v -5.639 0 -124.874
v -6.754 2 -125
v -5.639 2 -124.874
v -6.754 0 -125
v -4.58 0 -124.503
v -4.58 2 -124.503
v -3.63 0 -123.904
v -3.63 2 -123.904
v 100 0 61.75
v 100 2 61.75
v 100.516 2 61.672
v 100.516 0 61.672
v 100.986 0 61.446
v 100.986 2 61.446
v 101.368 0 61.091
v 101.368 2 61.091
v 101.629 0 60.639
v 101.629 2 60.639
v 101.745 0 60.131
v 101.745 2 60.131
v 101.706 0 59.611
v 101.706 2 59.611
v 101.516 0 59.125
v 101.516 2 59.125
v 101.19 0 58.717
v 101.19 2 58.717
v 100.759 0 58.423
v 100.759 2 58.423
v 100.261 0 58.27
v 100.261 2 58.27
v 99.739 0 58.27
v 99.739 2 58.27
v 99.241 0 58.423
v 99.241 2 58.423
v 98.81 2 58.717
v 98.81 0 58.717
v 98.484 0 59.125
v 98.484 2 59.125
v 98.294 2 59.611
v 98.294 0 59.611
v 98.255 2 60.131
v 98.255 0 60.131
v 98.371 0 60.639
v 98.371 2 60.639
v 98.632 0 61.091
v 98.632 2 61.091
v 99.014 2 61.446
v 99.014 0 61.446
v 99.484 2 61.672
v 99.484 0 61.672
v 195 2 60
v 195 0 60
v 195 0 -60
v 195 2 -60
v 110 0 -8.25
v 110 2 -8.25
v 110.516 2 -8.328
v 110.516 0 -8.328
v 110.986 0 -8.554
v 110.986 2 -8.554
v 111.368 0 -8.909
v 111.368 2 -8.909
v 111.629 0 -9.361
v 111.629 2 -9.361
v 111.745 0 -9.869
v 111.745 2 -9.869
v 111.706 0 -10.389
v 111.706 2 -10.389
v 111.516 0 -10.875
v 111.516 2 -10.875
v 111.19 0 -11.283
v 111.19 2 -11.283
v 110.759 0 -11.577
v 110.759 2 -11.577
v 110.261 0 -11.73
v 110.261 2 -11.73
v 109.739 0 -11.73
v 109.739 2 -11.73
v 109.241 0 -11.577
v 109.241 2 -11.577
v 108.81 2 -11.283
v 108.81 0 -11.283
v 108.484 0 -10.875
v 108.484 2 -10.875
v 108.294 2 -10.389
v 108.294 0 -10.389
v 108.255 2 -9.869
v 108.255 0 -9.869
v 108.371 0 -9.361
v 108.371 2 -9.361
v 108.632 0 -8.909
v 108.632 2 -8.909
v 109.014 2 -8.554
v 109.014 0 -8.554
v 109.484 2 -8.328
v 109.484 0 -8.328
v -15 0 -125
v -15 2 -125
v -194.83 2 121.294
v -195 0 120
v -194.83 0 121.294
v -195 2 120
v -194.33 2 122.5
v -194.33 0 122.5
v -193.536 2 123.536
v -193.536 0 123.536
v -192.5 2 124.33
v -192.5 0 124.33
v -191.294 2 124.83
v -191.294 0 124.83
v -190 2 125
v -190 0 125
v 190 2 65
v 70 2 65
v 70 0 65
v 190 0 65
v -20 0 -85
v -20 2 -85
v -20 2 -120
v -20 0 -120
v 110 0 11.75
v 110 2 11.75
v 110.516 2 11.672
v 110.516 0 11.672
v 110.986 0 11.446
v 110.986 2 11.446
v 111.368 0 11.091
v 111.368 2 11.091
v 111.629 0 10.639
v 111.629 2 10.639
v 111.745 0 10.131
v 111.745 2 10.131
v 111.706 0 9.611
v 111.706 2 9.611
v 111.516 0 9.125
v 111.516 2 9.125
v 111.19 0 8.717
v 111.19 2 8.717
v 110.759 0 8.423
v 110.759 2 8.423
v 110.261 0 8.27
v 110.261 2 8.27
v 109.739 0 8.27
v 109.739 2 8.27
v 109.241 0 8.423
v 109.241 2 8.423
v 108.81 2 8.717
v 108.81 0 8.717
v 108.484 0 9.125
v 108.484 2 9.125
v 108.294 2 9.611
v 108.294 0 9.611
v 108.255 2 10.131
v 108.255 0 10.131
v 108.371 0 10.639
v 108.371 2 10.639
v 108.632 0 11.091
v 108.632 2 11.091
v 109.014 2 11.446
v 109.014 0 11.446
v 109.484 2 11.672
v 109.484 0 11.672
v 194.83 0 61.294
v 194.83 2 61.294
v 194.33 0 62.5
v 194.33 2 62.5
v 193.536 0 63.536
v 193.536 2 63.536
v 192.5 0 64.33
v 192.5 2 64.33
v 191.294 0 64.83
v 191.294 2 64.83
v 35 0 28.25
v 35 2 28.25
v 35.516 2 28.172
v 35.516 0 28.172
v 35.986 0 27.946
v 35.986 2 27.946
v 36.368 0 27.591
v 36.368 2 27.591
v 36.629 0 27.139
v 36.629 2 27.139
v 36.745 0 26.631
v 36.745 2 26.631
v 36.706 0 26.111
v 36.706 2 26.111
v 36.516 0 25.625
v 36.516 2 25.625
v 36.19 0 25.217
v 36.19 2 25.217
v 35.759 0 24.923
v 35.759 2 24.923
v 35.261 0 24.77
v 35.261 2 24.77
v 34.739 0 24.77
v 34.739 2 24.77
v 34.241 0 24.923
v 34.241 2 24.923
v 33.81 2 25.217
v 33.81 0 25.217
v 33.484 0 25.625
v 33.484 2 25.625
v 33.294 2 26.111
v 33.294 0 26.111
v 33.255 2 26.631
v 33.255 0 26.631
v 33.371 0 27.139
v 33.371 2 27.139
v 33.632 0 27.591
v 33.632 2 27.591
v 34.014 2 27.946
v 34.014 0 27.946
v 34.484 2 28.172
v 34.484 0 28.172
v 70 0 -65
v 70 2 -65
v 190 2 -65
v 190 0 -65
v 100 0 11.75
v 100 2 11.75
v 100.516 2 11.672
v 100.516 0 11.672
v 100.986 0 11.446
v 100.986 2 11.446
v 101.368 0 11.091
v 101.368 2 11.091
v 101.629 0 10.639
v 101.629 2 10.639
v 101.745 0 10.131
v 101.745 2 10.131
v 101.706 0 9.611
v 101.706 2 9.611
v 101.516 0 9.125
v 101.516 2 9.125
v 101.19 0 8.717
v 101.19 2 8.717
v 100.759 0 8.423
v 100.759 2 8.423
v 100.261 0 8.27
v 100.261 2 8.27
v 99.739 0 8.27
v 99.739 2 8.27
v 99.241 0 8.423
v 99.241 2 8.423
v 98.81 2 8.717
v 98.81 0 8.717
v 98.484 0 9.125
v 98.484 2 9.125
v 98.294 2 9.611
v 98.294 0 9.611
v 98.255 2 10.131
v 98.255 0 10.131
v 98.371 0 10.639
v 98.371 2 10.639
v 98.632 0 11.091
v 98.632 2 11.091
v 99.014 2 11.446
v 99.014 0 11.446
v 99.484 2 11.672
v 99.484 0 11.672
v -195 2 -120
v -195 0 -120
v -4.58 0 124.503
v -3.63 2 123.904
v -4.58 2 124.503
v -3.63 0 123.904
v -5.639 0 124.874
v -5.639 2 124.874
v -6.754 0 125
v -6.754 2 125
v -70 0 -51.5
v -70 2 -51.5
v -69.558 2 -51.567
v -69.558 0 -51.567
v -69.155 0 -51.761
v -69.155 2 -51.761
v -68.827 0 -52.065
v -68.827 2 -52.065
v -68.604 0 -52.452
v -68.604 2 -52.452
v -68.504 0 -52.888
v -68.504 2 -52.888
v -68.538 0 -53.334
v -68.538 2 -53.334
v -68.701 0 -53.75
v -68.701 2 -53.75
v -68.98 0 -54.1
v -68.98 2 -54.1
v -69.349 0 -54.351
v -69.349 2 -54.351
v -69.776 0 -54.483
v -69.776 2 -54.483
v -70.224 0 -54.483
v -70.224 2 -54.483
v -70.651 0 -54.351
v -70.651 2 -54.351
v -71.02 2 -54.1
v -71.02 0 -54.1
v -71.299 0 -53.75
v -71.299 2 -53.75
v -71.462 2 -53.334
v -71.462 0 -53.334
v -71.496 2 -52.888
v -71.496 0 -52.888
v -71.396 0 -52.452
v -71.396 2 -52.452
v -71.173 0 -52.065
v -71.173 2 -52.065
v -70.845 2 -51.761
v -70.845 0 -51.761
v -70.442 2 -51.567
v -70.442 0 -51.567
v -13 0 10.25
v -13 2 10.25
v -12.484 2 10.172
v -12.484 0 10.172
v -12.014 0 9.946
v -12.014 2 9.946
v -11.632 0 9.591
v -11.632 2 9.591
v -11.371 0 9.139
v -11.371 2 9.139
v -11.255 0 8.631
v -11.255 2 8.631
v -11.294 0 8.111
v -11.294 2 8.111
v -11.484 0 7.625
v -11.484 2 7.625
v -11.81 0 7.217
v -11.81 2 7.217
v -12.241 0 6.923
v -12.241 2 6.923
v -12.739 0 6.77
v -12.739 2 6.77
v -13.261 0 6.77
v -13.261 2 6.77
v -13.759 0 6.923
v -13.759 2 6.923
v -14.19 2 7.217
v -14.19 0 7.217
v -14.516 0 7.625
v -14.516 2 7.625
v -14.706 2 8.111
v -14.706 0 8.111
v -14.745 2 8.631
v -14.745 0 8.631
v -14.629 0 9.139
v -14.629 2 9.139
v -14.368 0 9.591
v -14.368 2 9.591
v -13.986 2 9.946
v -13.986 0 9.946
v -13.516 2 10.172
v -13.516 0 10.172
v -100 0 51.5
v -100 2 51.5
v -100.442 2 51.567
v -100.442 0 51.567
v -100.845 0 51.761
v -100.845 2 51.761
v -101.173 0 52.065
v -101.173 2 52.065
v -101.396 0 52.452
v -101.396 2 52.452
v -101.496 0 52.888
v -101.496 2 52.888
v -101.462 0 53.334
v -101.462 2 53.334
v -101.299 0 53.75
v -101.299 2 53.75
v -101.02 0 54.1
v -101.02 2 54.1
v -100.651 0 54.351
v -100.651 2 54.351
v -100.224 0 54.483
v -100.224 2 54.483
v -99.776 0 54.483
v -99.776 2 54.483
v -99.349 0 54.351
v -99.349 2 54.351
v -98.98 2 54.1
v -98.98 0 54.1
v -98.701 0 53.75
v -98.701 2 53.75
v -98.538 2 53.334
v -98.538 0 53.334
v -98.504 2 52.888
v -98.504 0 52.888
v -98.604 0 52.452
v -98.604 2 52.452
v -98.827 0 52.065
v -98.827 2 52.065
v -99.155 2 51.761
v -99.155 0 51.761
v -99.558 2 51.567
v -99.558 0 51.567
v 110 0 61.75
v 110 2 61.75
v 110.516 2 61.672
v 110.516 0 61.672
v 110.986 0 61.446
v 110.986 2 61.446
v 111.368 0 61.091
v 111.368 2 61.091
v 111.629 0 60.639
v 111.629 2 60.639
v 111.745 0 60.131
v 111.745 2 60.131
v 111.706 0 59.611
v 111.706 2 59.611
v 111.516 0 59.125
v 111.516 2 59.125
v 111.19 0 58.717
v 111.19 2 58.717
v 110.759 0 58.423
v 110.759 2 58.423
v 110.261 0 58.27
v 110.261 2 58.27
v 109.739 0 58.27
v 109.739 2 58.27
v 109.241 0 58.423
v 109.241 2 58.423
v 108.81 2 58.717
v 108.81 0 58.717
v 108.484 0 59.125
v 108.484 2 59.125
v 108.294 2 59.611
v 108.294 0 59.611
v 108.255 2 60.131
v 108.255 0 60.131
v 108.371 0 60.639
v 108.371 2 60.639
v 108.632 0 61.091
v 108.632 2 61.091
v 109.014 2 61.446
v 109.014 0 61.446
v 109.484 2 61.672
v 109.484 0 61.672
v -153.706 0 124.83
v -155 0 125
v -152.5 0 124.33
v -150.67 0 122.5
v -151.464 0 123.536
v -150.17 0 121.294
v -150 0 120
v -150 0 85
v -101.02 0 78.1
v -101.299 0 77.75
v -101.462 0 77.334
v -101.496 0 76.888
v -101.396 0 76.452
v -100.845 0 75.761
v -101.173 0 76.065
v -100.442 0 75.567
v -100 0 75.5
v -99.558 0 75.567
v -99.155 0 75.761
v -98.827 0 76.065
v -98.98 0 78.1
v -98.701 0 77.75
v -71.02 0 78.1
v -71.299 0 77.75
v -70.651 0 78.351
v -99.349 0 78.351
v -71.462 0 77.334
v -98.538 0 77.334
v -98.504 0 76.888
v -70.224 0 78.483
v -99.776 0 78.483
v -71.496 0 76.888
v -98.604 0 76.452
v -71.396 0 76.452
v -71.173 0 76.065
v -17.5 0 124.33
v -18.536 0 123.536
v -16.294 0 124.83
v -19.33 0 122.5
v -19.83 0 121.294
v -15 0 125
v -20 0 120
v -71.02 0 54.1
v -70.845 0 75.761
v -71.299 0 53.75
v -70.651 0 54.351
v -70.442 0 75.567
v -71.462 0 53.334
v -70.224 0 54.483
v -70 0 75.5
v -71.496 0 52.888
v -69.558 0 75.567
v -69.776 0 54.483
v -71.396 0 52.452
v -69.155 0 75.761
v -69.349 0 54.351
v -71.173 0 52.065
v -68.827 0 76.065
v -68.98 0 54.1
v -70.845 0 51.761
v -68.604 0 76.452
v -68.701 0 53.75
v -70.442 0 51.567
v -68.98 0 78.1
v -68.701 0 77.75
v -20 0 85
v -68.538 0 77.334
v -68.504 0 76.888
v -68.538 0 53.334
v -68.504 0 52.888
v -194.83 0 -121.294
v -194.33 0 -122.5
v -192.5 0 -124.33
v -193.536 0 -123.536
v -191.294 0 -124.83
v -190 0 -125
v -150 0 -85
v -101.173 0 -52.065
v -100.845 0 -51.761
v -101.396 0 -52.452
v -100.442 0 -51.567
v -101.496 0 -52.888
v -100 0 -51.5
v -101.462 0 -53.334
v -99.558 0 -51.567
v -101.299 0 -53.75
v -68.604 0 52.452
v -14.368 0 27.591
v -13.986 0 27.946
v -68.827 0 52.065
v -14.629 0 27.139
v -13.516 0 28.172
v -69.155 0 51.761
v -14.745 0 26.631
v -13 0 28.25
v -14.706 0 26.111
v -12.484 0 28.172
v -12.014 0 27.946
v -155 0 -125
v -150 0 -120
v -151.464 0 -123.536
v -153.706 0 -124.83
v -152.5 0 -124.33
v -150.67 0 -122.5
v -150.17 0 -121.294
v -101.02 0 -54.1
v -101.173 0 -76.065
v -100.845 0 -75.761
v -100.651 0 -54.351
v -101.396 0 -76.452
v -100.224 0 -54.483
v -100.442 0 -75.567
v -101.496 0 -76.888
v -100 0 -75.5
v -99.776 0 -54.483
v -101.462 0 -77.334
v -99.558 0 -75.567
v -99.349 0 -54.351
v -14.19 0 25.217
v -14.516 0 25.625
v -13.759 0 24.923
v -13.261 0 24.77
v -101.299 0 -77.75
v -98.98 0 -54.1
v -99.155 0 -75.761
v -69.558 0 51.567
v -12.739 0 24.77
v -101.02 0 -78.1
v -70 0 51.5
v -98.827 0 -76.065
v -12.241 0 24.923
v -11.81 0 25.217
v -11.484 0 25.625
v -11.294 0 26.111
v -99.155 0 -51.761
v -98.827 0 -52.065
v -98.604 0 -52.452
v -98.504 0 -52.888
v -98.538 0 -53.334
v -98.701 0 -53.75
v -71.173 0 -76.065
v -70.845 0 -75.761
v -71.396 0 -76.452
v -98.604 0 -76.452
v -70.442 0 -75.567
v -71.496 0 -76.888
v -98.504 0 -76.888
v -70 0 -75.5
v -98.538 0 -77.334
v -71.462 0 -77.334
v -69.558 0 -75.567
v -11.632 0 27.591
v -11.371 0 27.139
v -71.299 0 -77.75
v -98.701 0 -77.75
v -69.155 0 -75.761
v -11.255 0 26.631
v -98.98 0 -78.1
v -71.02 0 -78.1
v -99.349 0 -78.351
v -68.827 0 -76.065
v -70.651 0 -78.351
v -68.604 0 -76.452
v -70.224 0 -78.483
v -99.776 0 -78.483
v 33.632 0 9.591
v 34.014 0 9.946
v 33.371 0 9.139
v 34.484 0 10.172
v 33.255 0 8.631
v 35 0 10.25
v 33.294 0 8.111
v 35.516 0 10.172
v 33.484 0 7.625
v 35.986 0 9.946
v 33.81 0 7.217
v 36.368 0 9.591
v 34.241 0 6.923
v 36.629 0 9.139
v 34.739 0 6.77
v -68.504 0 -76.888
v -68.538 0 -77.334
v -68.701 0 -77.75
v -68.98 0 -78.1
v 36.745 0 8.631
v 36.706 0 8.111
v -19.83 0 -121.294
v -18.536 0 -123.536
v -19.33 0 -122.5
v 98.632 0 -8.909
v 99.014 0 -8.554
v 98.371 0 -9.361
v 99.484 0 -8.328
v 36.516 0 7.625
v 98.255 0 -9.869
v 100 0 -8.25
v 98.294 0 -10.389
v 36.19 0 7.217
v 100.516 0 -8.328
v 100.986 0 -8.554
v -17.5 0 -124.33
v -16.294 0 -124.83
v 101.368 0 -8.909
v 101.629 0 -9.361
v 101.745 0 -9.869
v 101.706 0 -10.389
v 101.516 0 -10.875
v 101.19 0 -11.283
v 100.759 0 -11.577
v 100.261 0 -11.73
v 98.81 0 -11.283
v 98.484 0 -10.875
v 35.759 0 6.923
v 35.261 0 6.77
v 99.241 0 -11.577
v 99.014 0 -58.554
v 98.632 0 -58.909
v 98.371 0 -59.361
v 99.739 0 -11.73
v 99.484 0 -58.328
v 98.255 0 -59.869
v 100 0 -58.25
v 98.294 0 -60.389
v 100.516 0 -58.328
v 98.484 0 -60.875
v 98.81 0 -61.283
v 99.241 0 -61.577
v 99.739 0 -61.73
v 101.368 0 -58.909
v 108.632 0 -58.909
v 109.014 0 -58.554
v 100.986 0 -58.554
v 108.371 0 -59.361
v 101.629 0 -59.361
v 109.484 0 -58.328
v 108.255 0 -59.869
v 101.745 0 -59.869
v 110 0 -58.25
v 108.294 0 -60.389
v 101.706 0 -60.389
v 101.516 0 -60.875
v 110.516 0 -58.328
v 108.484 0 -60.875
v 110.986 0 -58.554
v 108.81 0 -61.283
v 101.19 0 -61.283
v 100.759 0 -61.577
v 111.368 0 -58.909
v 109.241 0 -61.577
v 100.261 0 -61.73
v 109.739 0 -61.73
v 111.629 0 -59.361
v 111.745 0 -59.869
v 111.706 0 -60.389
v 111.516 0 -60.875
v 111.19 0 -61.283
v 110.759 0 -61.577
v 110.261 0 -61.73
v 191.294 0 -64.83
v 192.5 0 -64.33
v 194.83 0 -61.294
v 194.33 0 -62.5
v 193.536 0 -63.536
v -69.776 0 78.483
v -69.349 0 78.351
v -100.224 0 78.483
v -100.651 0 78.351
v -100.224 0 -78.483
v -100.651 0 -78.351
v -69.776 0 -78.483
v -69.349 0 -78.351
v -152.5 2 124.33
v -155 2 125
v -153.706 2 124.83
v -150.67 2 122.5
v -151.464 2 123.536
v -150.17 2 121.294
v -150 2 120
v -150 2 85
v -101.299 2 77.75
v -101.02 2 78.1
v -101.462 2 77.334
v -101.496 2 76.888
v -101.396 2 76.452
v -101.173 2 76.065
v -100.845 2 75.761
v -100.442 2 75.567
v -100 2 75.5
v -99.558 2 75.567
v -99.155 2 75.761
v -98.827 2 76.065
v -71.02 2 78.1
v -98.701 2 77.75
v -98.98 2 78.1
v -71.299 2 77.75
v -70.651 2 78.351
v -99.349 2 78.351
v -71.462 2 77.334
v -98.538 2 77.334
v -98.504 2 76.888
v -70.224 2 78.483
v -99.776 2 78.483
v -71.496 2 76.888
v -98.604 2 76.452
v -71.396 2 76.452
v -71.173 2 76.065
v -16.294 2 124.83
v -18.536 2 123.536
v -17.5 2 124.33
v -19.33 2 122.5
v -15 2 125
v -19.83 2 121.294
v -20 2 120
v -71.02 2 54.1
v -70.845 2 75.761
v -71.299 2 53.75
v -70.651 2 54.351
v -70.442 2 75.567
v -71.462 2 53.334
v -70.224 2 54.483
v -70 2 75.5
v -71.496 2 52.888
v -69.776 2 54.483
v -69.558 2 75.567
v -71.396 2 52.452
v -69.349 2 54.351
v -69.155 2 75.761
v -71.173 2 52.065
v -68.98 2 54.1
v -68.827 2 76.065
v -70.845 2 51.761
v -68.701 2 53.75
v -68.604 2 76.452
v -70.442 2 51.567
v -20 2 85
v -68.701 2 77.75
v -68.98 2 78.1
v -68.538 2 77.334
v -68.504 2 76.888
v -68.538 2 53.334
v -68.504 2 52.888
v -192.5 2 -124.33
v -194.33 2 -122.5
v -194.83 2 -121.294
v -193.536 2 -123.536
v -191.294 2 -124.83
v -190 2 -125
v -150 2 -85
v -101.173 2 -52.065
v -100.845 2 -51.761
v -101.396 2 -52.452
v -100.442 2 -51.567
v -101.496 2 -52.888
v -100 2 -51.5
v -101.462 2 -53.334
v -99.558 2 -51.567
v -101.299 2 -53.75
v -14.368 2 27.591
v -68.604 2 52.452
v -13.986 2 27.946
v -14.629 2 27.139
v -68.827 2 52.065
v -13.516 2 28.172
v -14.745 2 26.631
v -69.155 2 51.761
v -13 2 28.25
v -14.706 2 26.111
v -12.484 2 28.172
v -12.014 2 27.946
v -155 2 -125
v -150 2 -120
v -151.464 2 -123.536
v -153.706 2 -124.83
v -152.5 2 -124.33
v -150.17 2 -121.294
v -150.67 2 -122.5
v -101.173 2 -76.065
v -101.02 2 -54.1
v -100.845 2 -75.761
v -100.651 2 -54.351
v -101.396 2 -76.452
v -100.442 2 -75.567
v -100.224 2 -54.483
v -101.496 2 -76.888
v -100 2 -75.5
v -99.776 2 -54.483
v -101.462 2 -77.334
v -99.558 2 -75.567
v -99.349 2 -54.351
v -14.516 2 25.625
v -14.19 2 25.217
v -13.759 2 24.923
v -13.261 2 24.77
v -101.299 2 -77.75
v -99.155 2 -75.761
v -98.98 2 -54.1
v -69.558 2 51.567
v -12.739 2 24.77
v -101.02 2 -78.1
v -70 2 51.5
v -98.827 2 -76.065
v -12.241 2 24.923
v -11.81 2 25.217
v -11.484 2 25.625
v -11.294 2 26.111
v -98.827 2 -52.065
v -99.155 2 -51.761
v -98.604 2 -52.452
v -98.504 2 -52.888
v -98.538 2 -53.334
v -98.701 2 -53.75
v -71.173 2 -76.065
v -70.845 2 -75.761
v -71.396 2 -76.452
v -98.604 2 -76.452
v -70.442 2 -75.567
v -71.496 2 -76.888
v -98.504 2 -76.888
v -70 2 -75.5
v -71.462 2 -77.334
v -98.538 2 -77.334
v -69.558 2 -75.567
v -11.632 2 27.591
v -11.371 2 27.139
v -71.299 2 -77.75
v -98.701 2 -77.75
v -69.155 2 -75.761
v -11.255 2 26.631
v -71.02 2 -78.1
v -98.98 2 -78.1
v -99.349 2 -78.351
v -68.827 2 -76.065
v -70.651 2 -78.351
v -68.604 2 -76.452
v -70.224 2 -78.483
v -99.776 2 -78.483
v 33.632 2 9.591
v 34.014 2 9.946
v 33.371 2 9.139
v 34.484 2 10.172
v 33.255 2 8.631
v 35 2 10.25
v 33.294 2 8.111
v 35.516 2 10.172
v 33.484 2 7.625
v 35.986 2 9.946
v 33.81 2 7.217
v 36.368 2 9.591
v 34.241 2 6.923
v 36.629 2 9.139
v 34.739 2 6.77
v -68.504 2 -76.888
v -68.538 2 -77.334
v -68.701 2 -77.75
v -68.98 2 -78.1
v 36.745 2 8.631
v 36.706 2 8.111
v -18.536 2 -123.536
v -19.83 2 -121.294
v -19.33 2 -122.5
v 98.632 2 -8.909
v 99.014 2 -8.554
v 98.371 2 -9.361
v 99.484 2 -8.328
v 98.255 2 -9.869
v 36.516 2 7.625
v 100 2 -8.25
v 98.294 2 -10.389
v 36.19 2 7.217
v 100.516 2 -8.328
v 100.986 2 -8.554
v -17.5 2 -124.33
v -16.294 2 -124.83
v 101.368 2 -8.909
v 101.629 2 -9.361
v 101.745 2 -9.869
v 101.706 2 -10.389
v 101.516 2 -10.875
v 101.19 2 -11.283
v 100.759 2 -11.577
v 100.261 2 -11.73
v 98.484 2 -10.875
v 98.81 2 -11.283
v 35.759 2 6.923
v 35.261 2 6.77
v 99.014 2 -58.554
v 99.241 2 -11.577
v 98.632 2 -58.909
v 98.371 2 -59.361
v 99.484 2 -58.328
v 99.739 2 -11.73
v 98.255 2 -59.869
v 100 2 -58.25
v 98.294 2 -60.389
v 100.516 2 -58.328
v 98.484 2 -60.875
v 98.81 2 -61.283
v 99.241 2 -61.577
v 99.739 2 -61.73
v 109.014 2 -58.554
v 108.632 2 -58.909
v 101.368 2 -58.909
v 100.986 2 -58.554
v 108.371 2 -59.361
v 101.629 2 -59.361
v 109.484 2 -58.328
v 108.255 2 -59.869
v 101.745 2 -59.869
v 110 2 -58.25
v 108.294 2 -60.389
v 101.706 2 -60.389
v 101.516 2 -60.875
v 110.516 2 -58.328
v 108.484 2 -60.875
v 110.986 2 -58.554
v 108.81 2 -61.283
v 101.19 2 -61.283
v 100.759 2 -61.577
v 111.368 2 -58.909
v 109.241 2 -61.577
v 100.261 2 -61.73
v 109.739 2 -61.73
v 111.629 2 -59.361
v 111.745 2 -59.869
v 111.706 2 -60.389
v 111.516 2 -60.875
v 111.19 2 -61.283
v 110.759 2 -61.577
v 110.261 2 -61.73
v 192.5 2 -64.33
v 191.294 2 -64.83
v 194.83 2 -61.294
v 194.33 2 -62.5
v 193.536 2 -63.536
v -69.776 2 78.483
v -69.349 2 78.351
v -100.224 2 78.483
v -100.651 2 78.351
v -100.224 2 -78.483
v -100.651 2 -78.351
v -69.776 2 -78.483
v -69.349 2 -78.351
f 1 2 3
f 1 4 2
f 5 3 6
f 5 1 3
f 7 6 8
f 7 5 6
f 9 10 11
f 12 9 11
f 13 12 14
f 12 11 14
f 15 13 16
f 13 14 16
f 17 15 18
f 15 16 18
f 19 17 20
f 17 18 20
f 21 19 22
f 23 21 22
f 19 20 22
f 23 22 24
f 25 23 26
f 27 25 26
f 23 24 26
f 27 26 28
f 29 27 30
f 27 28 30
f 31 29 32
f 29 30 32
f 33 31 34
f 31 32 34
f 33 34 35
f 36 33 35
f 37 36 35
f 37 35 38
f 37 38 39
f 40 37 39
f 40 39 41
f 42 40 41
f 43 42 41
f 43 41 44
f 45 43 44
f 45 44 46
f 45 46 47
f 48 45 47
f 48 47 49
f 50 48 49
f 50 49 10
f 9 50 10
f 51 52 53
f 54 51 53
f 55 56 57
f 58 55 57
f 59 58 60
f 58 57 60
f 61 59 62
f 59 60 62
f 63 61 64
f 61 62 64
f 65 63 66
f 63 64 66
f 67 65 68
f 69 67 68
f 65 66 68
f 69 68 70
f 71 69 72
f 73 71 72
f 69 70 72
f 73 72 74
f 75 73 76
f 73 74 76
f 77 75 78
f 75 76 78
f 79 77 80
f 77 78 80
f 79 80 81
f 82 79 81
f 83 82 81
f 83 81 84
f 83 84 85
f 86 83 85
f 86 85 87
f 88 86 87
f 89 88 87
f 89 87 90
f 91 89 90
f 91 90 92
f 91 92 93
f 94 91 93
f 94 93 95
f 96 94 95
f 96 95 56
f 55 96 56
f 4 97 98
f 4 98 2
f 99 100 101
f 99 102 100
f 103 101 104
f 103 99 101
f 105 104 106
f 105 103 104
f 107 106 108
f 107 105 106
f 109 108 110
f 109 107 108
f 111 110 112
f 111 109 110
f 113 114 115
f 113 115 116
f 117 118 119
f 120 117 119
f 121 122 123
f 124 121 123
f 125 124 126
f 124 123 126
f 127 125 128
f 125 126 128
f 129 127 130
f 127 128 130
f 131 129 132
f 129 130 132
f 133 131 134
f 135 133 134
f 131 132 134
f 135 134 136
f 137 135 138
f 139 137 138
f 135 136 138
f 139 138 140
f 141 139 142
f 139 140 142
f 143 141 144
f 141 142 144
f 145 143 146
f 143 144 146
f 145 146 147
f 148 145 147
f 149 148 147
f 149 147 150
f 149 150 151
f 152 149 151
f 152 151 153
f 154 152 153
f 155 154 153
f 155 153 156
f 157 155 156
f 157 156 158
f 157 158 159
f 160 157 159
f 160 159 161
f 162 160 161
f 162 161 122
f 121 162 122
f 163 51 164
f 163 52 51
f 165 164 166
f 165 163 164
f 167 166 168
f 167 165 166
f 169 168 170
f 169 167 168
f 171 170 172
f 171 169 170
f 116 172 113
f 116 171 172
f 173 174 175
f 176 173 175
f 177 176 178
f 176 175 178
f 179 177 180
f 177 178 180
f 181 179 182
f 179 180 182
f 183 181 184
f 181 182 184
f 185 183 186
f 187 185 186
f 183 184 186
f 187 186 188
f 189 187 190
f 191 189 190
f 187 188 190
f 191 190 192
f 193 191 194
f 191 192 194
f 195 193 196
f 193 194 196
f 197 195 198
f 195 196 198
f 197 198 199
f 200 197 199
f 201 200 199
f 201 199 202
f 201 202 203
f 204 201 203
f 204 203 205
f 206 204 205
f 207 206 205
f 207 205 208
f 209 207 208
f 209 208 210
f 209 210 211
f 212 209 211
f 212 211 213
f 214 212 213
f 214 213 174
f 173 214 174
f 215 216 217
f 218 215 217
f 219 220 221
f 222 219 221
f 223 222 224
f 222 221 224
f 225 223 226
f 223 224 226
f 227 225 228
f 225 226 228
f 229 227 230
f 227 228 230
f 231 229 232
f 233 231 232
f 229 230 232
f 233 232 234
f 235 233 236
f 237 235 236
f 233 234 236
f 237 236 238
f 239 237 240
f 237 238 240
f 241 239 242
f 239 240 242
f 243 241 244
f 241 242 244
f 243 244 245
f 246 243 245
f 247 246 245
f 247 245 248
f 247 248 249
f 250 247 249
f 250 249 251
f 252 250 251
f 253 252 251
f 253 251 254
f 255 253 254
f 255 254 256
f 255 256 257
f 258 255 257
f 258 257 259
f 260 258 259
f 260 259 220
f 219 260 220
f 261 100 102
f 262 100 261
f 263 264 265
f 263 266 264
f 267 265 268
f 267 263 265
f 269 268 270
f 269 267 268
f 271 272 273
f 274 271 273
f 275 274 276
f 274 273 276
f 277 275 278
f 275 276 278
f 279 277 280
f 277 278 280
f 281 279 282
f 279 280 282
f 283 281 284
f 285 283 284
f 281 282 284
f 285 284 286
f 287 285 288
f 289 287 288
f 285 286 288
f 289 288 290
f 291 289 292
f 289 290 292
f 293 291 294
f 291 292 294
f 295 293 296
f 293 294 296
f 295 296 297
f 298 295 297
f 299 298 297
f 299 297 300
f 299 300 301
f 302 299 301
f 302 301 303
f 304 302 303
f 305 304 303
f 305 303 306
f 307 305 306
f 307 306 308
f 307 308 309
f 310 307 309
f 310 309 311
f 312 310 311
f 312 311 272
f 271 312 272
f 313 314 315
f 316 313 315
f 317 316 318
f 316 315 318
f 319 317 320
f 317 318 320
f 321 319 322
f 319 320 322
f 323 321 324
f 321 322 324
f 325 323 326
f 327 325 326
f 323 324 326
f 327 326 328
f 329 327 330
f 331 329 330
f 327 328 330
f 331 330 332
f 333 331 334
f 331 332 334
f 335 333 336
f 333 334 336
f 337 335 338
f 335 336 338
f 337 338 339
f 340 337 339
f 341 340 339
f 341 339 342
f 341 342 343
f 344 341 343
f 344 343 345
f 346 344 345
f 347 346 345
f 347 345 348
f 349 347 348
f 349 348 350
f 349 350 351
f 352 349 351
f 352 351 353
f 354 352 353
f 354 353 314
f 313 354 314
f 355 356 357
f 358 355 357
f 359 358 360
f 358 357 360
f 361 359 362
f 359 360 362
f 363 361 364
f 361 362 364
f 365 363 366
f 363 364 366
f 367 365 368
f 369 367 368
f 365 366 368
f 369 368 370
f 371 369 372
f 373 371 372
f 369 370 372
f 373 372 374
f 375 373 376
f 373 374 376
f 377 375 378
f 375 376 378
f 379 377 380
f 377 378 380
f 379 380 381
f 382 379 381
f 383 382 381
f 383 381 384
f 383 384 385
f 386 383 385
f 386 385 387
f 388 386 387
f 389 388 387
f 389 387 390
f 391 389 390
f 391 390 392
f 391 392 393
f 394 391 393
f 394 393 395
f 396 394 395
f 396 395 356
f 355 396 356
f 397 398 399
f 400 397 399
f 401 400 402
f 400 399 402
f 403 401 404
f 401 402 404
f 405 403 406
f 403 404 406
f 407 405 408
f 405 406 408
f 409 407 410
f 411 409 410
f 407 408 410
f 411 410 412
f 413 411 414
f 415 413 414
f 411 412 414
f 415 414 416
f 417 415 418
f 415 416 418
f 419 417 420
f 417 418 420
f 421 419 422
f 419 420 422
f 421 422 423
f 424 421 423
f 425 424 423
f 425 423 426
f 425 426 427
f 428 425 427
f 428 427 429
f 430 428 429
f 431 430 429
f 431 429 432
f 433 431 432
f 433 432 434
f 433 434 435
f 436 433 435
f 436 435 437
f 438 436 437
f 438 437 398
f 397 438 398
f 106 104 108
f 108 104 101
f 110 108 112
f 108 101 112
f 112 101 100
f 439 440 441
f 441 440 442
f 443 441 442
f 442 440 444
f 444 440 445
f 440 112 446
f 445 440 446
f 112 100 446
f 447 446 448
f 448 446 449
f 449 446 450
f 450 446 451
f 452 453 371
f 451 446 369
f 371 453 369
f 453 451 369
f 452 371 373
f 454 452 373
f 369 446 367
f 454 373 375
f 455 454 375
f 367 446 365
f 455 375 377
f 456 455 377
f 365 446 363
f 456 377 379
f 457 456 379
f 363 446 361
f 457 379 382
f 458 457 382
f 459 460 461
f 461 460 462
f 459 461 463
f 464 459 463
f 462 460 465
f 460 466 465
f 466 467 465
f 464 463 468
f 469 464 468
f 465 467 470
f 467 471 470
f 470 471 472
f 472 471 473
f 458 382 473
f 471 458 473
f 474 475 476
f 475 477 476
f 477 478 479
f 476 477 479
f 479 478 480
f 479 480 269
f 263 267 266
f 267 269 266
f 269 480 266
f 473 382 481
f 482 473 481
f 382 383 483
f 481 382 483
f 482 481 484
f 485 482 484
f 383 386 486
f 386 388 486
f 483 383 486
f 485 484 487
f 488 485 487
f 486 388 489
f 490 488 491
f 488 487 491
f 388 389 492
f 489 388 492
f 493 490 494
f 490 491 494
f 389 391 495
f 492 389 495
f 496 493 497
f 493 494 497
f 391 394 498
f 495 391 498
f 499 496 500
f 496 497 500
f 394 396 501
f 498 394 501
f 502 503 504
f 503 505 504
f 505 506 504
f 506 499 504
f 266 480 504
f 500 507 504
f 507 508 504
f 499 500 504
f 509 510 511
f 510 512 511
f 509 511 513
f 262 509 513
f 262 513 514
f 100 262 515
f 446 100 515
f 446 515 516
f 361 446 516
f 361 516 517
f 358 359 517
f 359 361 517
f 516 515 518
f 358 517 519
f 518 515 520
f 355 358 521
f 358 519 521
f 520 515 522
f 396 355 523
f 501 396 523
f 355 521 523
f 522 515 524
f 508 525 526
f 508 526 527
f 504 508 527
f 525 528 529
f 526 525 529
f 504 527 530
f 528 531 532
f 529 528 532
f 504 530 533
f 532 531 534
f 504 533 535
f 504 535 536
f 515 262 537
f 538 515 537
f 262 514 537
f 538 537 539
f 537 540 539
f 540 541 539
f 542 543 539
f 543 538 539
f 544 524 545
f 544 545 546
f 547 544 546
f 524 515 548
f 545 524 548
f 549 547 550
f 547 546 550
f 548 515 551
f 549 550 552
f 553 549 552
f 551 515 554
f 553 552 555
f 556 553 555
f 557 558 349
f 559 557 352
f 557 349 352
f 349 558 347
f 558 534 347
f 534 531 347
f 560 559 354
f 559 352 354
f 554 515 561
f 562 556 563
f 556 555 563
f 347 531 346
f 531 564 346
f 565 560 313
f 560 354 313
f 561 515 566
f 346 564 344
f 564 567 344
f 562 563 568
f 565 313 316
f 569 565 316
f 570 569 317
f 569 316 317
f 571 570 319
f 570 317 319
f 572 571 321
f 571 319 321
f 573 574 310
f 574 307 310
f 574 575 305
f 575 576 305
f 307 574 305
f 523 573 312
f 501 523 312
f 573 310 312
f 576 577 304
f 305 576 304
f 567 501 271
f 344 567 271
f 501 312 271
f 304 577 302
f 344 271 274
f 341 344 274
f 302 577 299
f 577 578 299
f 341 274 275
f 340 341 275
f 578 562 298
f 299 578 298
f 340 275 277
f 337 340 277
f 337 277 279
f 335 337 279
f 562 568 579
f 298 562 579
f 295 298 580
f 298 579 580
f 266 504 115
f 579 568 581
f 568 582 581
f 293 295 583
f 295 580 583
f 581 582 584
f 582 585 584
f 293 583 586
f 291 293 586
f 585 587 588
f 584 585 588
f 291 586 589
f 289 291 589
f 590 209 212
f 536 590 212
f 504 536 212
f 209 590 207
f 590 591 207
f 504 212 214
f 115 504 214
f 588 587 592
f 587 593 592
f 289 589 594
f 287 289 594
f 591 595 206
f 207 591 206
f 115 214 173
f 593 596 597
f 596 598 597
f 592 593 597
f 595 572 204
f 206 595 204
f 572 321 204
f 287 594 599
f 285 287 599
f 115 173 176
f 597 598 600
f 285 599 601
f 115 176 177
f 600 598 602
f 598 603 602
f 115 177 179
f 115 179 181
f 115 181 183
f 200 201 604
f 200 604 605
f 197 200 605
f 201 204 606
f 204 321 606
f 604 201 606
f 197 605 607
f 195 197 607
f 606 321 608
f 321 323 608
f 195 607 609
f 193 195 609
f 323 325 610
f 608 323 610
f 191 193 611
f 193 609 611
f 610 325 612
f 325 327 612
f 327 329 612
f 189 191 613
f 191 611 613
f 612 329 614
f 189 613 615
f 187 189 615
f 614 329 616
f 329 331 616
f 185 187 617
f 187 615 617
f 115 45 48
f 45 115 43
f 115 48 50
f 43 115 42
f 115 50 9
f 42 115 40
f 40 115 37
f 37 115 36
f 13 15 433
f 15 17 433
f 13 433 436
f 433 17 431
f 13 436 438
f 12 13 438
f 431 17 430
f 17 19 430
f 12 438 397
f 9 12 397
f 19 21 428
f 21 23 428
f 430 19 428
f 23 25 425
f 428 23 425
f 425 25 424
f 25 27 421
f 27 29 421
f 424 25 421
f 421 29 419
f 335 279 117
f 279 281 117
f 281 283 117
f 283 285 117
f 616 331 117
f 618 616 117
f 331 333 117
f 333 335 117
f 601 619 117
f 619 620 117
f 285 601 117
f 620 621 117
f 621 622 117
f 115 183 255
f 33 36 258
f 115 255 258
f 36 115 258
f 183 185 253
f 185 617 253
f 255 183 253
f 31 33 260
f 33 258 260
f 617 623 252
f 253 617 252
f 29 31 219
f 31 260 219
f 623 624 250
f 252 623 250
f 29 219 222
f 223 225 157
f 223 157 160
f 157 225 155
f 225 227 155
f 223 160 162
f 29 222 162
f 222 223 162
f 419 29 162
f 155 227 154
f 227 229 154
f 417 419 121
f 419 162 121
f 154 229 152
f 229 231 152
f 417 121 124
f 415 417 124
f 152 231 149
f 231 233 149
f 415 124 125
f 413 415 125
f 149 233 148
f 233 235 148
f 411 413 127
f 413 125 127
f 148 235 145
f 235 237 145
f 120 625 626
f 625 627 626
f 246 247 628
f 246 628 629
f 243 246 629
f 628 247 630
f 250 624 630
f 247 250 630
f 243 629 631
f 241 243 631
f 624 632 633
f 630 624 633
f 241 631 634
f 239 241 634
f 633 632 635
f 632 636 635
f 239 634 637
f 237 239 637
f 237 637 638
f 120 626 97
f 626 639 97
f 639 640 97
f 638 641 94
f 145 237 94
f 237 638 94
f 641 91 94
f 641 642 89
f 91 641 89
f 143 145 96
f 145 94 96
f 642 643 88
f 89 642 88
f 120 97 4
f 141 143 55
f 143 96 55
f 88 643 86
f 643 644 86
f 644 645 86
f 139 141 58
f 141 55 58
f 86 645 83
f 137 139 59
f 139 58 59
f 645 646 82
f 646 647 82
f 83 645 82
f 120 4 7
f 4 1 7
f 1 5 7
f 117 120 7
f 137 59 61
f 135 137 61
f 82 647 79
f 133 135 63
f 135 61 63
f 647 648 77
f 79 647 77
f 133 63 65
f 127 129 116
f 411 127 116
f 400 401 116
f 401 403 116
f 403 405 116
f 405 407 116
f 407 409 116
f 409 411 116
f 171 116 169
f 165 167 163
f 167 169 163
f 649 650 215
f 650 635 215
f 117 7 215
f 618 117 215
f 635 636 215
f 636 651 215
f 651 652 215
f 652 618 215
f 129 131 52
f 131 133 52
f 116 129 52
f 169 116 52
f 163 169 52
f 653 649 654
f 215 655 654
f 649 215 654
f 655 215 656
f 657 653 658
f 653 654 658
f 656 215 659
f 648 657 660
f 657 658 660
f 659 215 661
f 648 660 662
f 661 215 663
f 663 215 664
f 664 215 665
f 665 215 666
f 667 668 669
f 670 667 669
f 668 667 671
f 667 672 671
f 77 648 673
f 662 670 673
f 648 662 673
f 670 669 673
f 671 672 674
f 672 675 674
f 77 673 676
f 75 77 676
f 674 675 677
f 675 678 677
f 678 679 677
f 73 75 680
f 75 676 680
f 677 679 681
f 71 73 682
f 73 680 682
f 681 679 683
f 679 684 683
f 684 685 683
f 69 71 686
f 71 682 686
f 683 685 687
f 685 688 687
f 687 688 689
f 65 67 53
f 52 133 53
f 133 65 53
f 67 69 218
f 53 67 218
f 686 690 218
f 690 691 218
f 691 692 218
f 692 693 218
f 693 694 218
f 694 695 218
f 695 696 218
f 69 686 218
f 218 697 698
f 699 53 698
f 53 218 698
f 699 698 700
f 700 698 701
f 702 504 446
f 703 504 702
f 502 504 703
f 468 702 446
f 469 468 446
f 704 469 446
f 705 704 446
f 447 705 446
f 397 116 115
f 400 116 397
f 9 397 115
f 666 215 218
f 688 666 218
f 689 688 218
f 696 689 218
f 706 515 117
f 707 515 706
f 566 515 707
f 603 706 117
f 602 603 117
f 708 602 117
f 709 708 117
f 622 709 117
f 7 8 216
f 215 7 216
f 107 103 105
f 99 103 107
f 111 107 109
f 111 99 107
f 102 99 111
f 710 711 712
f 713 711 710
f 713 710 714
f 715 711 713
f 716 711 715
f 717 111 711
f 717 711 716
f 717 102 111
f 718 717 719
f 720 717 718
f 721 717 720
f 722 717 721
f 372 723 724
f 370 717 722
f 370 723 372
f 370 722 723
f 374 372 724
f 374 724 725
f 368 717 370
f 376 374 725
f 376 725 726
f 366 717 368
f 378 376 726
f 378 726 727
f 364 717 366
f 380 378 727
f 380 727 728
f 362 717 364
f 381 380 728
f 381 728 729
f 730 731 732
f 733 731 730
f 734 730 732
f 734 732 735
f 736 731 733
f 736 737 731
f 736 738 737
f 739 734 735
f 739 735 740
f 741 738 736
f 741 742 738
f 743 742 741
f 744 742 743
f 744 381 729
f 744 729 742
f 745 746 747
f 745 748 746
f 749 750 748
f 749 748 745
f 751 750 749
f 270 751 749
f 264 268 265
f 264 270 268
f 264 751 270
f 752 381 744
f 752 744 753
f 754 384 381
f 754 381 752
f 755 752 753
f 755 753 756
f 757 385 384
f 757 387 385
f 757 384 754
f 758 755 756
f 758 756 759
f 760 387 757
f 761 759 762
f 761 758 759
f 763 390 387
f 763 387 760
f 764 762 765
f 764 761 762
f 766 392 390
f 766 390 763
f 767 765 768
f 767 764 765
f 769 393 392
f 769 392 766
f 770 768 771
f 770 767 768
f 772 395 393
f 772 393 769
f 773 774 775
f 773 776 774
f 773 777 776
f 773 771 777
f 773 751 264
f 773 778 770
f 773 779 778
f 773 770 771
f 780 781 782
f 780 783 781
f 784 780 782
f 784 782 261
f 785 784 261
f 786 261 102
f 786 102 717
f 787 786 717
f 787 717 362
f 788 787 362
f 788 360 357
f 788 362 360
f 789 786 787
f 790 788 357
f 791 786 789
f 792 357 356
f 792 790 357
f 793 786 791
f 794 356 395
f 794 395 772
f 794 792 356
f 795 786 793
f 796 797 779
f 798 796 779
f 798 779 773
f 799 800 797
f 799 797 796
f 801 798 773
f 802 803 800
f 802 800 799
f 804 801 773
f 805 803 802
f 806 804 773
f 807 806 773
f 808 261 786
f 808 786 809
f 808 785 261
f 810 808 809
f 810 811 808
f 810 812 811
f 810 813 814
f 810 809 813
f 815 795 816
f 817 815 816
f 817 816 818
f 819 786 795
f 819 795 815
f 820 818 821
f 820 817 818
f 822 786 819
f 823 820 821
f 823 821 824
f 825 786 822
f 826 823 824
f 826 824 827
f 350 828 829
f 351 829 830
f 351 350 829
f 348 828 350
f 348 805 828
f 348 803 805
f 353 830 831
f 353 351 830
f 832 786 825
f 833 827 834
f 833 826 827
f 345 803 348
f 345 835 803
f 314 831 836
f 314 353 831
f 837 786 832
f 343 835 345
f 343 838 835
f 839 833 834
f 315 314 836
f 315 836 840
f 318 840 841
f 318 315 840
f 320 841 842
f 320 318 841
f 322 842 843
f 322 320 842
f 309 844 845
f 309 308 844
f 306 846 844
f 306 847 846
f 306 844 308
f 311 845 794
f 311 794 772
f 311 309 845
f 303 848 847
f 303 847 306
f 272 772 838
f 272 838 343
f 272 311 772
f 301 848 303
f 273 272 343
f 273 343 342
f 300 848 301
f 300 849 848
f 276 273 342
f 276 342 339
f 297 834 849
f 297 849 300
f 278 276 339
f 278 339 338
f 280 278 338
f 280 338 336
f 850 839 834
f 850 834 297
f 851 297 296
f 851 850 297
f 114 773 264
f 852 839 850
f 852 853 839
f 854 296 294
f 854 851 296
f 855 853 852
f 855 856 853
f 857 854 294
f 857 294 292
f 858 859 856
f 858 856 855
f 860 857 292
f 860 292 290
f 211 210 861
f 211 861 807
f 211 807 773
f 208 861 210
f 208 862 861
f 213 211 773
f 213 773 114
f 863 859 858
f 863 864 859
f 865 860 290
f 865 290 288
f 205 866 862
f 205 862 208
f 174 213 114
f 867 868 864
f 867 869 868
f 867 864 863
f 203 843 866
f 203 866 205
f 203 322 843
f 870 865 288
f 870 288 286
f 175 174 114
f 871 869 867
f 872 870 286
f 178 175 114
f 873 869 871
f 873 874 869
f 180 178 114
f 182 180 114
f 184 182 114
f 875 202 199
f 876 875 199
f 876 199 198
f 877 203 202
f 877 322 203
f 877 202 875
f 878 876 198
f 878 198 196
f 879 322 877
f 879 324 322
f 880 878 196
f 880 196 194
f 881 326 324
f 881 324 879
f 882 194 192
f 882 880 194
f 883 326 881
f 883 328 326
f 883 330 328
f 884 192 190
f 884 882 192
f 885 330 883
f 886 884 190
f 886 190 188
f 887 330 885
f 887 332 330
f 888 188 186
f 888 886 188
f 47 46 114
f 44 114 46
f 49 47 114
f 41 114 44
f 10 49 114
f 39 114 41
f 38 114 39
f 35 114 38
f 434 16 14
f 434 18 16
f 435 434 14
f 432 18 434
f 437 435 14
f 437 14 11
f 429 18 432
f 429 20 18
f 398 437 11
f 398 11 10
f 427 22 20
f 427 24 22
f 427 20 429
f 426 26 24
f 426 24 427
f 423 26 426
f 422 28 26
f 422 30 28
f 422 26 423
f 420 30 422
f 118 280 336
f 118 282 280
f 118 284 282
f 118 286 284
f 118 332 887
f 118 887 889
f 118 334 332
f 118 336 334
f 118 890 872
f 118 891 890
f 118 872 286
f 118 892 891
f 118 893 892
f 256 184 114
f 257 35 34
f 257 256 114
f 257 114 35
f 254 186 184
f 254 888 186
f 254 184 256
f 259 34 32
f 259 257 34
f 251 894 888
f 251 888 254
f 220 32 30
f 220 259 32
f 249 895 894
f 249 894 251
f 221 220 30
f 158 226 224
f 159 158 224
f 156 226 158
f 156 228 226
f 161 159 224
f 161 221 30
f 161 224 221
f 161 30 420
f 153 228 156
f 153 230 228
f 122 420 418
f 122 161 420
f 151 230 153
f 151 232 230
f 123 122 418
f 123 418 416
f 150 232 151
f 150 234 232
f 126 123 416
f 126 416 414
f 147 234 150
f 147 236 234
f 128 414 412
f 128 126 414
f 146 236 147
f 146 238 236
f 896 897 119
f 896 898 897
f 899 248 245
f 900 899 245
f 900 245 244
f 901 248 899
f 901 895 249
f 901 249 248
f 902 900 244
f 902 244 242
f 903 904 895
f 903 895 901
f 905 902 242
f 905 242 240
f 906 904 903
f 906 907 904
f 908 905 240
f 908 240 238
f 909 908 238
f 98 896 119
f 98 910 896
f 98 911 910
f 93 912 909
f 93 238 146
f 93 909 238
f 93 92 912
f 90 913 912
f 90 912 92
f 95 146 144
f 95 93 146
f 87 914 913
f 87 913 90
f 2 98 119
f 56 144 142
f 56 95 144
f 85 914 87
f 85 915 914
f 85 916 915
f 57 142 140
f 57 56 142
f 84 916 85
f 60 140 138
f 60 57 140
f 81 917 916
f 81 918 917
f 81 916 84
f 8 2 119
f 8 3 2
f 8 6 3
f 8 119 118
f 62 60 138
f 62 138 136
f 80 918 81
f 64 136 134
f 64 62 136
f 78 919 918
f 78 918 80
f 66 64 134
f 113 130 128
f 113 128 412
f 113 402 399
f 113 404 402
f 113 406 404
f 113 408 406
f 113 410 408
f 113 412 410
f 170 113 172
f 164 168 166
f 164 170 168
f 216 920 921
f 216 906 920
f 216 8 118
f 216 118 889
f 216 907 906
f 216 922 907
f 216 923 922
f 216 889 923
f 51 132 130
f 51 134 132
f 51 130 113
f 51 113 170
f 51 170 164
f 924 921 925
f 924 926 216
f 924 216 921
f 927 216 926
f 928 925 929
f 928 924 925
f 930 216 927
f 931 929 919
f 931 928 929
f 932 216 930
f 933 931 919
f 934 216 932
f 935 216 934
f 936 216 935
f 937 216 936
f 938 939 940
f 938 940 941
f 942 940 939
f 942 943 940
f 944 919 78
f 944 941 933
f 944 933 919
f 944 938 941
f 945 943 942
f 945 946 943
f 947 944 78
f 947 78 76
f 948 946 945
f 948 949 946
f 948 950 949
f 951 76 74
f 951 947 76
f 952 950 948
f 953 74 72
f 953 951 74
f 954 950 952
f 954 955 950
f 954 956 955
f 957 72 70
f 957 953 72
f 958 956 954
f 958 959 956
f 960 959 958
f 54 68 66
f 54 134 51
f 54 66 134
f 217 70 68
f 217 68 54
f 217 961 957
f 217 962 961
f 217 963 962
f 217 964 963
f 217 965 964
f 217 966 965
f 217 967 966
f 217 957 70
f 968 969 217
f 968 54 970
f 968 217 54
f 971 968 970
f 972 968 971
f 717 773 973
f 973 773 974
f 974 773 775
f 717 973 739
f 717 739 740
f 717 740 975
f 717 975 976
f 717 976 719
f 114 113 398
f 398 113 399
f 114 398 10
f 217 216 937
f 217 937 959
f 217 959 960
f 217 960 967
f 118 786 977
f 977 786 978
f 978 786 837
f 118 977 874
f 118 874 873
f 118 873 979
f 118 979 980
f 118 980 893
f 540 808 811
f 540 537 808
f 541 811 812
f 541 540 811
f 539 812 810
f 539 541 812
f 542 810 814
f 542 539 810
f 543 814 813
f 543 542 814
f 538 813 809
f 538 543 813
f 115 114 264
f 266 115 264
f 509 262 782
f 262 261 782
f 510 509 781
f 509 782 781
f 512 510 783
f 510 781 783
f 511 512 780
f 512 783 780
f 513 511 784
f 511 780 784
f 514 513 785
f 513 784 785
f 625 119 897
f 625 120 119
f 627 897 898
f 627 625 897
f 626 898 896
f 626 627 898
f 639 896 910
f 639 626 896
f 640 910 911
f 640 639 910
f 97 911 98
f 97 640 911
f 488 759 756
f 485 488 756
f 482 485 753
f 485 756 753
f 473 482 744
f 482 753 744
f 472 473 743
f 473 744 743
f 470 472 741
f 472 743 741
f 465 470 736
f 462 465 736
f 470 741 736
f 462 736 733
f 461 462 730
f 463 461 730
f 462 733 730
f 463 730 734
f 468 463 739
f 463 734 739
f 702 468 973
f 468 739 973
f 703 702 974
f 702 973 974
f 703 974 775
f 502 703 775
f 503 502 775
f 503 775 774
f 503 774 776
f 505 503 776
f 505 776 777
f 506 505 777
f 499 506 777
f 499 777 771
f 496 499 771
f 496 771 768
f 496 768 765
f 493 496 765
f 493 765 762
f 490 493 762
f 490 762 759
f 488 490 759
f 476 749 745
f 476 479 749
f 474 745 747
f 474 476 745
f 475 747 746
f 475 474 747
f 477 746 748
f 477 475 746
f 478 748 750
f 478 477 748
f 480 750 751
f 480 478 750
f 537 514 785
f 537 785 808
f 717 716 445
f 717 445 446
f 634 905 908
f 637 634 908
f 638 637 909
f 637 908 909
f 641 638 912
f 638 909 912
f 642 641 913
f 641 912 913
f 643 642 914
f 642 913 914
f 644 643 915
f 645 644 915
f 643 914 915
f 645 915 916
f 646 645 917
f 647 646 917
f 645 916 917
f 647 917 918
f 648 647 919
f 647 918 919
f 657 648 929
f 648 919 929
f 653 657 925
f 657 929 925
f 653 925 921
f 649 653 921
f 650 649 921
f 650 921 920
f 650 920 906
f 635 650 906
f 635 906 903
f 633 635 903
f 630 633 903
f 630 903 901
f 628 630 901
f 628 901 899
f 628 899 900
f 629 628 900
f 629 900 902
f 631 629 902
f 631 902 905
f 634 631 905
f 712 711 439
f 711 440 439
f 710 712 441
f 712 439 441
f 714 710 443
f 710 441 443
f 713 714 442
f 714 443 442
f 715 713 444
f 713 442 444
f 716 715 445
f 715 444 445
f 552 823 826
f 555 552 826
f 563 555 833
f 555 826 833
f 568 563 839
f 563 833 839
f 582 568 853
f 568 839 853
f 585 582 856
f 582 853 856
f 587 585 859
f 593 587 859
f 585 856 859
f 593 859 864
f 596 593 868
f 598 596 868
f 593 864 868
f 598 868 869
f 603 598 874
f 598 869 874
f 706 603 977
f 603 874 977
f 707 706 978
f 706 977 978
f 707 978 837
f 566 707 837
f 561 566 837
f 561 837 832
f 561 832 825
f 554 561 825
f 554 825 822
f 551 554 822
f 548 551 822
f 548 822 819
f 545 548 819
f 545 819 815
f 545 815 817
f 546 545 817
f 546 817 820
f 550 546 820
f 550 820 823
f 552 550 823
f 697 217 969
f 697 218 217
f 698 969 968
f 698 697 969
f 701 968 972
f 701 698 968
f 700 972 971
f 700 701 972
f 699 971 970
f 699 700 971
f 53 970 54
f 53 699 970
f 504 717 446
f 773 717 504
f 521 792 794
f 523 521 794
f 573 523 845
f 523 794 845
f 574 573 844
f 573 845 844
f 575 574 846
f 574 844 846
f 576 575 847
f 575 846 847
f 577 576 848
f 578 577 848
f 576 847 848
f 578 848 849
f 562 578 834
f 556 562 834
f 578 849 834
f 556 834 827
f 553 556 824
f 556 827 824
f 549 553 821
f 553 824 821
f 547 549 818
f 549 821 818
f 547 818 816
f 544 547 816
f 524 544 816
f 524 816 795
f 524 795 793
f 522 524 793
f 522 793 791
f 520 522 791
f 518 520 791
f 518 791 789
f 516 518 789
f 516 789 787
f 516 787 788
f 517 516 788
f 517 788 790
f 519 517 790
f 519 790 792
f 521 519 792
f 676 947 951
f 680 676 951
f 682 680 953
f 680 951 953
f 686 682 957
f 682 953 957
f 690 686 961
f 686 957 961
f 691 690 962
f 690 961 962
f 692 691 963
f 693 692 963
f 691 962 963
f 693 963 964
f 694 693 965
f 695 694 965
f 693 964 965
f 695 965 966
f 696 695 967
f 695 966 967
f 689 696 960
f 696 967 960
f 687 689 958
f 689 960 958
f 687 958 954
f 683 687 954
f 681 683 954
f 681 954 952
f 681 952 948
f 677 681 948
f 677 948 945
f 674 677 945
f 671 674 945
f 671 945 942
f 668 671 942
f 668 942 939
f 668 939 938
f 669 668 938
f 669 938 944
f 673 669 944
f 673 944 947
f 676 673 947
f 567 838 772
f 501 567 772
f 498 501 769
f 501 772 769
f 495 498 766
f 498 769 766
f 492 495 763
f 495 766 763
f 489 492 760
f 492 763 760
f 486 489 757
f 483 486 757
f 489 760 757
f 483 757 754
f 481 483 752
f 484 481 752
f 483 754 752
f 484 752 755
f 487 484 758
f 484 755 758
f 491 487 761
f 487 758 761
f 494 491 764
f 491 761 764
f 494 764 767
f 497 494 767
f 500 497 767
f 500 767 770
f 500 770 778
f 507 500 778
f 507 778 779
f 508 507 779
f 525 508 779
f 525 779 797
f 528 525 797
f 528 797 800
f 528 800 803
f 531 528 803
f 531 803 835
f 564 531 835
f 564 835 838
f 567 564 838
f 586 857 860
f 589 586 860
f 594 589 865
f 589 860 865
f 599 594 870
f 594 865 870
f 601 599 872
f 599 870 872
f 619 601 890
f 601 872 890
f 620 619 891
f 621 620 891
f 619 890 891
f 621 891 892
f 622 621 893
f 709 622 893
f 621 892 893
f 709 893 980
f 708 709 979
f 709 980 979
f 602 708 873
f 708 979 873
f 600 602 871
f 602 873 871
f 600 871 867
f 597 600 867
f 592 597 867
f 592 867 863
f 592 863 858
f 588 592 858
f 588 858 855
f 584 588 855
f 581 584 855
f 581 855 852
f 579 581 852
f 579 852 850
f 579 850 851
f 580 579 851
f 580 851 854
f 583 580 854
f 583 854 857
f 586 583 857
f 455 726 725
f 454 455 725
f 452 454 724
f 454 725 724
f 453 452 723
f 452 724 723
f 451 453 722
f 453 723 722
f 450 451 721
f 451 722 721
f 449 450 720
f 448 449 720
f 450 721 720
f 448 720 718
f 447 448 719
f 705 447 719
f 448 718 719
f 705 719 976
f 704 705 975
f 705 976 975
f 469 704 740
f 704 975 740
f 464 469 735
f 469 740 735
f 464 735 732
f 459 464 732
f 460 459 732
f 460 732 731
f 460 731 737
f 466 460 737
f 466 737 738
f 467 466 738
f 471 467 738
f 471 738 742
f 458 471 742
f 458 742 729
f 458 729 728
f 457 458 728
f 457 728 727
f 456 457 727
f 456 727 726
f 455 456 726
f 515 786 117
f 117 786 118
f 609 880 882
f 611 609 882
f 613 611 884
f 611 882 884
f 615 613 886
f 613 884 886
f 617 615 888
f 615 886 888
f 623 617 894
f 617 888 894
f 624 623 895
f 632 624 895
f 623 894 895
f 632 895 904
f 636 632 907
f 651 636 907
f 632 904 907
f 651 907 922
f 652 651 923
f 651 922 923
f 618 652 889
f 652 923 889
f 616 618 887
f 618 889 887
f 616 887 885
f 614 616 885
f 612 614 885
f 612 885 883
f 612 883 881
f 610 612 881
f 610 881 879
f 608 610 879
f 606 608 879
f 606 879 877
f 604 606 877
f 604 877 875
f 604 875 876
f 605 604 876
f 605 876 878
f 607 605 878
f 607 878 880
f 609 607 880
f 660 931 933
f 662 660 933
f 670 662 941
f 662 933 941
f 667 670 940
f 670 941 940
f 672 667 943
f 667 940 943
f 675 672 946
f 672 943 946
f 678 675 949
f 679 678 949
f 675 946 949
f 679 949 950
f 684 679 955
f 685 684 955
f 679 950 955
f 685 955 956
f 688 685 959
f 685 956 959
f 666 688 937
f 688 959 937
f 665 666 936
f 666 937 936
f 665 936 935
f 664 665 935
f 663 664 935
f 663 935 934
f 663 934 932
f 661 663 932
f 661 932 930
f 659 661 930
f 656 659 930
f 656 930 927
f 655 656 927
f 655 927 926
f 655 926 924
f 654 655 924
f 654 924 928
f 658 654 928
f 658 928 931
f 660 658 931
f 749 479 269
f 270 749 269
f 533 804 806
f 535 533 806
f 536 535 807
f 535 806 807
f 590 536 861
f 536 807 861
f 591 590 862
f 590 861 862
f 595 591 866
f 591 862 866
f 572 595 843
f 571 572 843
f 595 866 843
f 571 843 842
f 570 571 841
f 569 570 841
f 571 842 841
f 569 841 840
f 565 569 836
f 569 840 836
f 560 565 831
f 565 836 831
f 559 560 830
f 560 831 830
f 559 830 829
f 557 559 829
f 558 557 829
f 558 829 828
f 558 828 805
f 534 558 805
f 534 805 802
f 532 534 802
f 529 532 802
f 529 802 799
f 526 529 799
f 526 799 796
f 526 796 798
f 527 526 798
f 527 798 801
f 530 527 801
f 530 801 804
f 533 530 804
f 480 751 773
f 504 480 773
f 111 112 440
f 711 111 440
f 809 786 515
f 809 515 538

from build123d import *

# Parameters (mm, degrees)
SKETCH_1_W          = 390
SKETCH_1_H          = 250
EXTRUDE_1_DEPTH     = 2
SKETCH_2_W          = 130
SKETCH_2_H          = 40
SKETCH_2_W_2        = 125
SKETCH_2_H_2        = 60
CUT_EXTRUDE_1_DEPTH = 5
CUT_EXTRUDE_2_DEPTH = 10
FILLET_1_R          = 5
SKETCH_4_R          = 1.5
SKETCH_4_R_2        = 1.75
CUT_EXTRUDE_3_DEPTH = 232.633330935
SKETCH_5_R          = 1.75
CUT_EXTRUDE_4_DEPTH = 232.633330935


with BuildPart() as part:
    # 스케치1 → 보스-돌출1 (new body)
    with BuildSketch(Plane(origin=(0, 0, 0), x_dir=(1, 0, 0), z_dir=(0, 1, 0))):
        Rectangle(SKETCH_1_W, SKETCH_1_H)
    extrude(amount=EXTRUDE_1_DEPTH)

    # 스케치2 → 컷-돌출1 (cut)
    with BuildSketch(Plane(origin=(0, 2, 0), x_dir=(1, 0, 0), z_dir=(0, 1, 0))):
        with Locations((-85, 105)):
            Rectangle(SKETCH_2_W, SKETCH_2_H)
        with Locations((-85, -105)):
            Rectangle(SKETCH_2_W, SKETCH_2_H)
        with Locations((132.5, 95)):
            Rectangle(SKETCH_2_W_2, SKETCH_2_H_2)
        with Locations((132.5, -95)):
            Rectangle(SKETCH_2_W_2, SKETCH_2_H_2)
    extrude(amount=-CUT_EXTRUDE_1_DEPTH, mode=Mode.SUBTRACT)

    # 스케치3 → 컷-돌출2 (cut)
    with BuildSketch(Plane(origin=(0, 2, 0), x_dir=(1, 0, 0), z_dir=(0, 1, 0))):
        Polygon((-5, 125), (70, 65), (70, 125), align=None)
        Polygon((70, -65), (-5, -125), (70, -125), align=None)
    extrude(amount=-CUT_EXTRUDE_2_DEPTH, mode=Mode.SUBTRACT)

    # 필렛1
    fillet_1_edges = [part.edges().sort_by_distance(p)[0] for p in [
        (-5, 1, -125),
        (-5, 1, 125),
        (-150, 1, 125),
        (-20, 1, 125),
        (195, 1, -65),
        (195, 1, 65),
        (-150, 1, -125),
        (-20, 1, -125),
        (-195, 1, 125),
        (-195, 1, -125),
    ]]
    fillet(fillet_1_edges, radius=FILLET_1_R)

    # 스케치4 → 컷-돌출3 (cut, through all)
    with BuildSketch(Plane(origin=(0, 2, 0), x_dir=(1, 0, 0), z_dir=(0, 1, 0))):
        with Locations(Location((-100, 77, 0), (0, 0, 270))):
            Circle(SKETCH_4_R)
        with Locations(Location((-70, 77, 0), (0, 0, 270))):
            Circle(SKETCH_4_R)
        with Locations(Location((-70, 53, 0), (0, 0, 270))):
            Circle(SKETCH_4_R)
        with Locations(Location((-100, 53, 0), (0, 0, 270))):
            Circle(SKETCH_4_R)
        with Locations(Location((-100, -53, 0), (0, 0, 90))):
            Circle(SKETCH_4_R)
        with Locations(Location((-70, -53, 0), (0, 0, 90))):
            Circle(SKETCH_4_R)
        with Locations(Location((-70, -77, 0), (0, 0, 90))):
            Circle(SKETCH_4_R)
        with Locations(Location((-100, -77, 0), (0, 0, 90))):
            Circle(SKETCH_4_R)
        with Locations(Location((100, 60, 0), (0, 0, 270))):
            Circle(SKETCH_4_R_2)
        with Locations(Location((110, 60, 0), (0, 0, 270))):
            Circle(SKETCH_4_R_2)
        with Locations(Location((100, 10, 0), (0, 0, 270))):
            Circle(SKETCH_4_R_2)
        with Locations(Location((110, 10, 0), (0, 0, 270))):
            Circle(SKETCH_4_R_2)
        with Locations(Location((100, -10, 0), (0, 0, 270))):
            Circle(SKETCH_4_R_2)
        with Locations(Location((110, -10, 0), (0, 0, 270))):
            Circle(SKETCH_4_R_2)
        with Locations(Location((100, -60, 0), (0, 0, 270))):
            Circle(SKETCH_4_R_2)
        with Locations(Location((110, -60, 0), (0, 0, 270))):
            Circle(SKETCH_4_R_2)
    extrude(amount=-CUT_EXTRUDE_3_DEPTH, mode=Mode.SUBTRACT)

    # 스케치5 → 컷-돌출4 (cut, through all)
    with BuildSketch(Plane(origin=(0, 2, 0), x_dir=(1, 0, 0), z_dir=(0, 1, 0))):
        with Locations(Location((-13, -8.5, 0), (0, 0, 270))):
            Circle(SKETCH_5_R)
        with Locations(Location((35, -8.5, 0), (0, 0, 270))):
            Circle(SKETCH_5_R)
        with Locations(Location((-13, -26.5, 0), (0, 0, 270))):
            Circle(SKETCH_5_R)
        with Locations(Location((35, -26.5, 0), (0, 0, 270))):
            Circle(SKETCH_5_R)
    extrude(amount=-CUT_EXTRUDE_4_DEPTH, mode=Mode.SUBTRACT)


solid = part.part
